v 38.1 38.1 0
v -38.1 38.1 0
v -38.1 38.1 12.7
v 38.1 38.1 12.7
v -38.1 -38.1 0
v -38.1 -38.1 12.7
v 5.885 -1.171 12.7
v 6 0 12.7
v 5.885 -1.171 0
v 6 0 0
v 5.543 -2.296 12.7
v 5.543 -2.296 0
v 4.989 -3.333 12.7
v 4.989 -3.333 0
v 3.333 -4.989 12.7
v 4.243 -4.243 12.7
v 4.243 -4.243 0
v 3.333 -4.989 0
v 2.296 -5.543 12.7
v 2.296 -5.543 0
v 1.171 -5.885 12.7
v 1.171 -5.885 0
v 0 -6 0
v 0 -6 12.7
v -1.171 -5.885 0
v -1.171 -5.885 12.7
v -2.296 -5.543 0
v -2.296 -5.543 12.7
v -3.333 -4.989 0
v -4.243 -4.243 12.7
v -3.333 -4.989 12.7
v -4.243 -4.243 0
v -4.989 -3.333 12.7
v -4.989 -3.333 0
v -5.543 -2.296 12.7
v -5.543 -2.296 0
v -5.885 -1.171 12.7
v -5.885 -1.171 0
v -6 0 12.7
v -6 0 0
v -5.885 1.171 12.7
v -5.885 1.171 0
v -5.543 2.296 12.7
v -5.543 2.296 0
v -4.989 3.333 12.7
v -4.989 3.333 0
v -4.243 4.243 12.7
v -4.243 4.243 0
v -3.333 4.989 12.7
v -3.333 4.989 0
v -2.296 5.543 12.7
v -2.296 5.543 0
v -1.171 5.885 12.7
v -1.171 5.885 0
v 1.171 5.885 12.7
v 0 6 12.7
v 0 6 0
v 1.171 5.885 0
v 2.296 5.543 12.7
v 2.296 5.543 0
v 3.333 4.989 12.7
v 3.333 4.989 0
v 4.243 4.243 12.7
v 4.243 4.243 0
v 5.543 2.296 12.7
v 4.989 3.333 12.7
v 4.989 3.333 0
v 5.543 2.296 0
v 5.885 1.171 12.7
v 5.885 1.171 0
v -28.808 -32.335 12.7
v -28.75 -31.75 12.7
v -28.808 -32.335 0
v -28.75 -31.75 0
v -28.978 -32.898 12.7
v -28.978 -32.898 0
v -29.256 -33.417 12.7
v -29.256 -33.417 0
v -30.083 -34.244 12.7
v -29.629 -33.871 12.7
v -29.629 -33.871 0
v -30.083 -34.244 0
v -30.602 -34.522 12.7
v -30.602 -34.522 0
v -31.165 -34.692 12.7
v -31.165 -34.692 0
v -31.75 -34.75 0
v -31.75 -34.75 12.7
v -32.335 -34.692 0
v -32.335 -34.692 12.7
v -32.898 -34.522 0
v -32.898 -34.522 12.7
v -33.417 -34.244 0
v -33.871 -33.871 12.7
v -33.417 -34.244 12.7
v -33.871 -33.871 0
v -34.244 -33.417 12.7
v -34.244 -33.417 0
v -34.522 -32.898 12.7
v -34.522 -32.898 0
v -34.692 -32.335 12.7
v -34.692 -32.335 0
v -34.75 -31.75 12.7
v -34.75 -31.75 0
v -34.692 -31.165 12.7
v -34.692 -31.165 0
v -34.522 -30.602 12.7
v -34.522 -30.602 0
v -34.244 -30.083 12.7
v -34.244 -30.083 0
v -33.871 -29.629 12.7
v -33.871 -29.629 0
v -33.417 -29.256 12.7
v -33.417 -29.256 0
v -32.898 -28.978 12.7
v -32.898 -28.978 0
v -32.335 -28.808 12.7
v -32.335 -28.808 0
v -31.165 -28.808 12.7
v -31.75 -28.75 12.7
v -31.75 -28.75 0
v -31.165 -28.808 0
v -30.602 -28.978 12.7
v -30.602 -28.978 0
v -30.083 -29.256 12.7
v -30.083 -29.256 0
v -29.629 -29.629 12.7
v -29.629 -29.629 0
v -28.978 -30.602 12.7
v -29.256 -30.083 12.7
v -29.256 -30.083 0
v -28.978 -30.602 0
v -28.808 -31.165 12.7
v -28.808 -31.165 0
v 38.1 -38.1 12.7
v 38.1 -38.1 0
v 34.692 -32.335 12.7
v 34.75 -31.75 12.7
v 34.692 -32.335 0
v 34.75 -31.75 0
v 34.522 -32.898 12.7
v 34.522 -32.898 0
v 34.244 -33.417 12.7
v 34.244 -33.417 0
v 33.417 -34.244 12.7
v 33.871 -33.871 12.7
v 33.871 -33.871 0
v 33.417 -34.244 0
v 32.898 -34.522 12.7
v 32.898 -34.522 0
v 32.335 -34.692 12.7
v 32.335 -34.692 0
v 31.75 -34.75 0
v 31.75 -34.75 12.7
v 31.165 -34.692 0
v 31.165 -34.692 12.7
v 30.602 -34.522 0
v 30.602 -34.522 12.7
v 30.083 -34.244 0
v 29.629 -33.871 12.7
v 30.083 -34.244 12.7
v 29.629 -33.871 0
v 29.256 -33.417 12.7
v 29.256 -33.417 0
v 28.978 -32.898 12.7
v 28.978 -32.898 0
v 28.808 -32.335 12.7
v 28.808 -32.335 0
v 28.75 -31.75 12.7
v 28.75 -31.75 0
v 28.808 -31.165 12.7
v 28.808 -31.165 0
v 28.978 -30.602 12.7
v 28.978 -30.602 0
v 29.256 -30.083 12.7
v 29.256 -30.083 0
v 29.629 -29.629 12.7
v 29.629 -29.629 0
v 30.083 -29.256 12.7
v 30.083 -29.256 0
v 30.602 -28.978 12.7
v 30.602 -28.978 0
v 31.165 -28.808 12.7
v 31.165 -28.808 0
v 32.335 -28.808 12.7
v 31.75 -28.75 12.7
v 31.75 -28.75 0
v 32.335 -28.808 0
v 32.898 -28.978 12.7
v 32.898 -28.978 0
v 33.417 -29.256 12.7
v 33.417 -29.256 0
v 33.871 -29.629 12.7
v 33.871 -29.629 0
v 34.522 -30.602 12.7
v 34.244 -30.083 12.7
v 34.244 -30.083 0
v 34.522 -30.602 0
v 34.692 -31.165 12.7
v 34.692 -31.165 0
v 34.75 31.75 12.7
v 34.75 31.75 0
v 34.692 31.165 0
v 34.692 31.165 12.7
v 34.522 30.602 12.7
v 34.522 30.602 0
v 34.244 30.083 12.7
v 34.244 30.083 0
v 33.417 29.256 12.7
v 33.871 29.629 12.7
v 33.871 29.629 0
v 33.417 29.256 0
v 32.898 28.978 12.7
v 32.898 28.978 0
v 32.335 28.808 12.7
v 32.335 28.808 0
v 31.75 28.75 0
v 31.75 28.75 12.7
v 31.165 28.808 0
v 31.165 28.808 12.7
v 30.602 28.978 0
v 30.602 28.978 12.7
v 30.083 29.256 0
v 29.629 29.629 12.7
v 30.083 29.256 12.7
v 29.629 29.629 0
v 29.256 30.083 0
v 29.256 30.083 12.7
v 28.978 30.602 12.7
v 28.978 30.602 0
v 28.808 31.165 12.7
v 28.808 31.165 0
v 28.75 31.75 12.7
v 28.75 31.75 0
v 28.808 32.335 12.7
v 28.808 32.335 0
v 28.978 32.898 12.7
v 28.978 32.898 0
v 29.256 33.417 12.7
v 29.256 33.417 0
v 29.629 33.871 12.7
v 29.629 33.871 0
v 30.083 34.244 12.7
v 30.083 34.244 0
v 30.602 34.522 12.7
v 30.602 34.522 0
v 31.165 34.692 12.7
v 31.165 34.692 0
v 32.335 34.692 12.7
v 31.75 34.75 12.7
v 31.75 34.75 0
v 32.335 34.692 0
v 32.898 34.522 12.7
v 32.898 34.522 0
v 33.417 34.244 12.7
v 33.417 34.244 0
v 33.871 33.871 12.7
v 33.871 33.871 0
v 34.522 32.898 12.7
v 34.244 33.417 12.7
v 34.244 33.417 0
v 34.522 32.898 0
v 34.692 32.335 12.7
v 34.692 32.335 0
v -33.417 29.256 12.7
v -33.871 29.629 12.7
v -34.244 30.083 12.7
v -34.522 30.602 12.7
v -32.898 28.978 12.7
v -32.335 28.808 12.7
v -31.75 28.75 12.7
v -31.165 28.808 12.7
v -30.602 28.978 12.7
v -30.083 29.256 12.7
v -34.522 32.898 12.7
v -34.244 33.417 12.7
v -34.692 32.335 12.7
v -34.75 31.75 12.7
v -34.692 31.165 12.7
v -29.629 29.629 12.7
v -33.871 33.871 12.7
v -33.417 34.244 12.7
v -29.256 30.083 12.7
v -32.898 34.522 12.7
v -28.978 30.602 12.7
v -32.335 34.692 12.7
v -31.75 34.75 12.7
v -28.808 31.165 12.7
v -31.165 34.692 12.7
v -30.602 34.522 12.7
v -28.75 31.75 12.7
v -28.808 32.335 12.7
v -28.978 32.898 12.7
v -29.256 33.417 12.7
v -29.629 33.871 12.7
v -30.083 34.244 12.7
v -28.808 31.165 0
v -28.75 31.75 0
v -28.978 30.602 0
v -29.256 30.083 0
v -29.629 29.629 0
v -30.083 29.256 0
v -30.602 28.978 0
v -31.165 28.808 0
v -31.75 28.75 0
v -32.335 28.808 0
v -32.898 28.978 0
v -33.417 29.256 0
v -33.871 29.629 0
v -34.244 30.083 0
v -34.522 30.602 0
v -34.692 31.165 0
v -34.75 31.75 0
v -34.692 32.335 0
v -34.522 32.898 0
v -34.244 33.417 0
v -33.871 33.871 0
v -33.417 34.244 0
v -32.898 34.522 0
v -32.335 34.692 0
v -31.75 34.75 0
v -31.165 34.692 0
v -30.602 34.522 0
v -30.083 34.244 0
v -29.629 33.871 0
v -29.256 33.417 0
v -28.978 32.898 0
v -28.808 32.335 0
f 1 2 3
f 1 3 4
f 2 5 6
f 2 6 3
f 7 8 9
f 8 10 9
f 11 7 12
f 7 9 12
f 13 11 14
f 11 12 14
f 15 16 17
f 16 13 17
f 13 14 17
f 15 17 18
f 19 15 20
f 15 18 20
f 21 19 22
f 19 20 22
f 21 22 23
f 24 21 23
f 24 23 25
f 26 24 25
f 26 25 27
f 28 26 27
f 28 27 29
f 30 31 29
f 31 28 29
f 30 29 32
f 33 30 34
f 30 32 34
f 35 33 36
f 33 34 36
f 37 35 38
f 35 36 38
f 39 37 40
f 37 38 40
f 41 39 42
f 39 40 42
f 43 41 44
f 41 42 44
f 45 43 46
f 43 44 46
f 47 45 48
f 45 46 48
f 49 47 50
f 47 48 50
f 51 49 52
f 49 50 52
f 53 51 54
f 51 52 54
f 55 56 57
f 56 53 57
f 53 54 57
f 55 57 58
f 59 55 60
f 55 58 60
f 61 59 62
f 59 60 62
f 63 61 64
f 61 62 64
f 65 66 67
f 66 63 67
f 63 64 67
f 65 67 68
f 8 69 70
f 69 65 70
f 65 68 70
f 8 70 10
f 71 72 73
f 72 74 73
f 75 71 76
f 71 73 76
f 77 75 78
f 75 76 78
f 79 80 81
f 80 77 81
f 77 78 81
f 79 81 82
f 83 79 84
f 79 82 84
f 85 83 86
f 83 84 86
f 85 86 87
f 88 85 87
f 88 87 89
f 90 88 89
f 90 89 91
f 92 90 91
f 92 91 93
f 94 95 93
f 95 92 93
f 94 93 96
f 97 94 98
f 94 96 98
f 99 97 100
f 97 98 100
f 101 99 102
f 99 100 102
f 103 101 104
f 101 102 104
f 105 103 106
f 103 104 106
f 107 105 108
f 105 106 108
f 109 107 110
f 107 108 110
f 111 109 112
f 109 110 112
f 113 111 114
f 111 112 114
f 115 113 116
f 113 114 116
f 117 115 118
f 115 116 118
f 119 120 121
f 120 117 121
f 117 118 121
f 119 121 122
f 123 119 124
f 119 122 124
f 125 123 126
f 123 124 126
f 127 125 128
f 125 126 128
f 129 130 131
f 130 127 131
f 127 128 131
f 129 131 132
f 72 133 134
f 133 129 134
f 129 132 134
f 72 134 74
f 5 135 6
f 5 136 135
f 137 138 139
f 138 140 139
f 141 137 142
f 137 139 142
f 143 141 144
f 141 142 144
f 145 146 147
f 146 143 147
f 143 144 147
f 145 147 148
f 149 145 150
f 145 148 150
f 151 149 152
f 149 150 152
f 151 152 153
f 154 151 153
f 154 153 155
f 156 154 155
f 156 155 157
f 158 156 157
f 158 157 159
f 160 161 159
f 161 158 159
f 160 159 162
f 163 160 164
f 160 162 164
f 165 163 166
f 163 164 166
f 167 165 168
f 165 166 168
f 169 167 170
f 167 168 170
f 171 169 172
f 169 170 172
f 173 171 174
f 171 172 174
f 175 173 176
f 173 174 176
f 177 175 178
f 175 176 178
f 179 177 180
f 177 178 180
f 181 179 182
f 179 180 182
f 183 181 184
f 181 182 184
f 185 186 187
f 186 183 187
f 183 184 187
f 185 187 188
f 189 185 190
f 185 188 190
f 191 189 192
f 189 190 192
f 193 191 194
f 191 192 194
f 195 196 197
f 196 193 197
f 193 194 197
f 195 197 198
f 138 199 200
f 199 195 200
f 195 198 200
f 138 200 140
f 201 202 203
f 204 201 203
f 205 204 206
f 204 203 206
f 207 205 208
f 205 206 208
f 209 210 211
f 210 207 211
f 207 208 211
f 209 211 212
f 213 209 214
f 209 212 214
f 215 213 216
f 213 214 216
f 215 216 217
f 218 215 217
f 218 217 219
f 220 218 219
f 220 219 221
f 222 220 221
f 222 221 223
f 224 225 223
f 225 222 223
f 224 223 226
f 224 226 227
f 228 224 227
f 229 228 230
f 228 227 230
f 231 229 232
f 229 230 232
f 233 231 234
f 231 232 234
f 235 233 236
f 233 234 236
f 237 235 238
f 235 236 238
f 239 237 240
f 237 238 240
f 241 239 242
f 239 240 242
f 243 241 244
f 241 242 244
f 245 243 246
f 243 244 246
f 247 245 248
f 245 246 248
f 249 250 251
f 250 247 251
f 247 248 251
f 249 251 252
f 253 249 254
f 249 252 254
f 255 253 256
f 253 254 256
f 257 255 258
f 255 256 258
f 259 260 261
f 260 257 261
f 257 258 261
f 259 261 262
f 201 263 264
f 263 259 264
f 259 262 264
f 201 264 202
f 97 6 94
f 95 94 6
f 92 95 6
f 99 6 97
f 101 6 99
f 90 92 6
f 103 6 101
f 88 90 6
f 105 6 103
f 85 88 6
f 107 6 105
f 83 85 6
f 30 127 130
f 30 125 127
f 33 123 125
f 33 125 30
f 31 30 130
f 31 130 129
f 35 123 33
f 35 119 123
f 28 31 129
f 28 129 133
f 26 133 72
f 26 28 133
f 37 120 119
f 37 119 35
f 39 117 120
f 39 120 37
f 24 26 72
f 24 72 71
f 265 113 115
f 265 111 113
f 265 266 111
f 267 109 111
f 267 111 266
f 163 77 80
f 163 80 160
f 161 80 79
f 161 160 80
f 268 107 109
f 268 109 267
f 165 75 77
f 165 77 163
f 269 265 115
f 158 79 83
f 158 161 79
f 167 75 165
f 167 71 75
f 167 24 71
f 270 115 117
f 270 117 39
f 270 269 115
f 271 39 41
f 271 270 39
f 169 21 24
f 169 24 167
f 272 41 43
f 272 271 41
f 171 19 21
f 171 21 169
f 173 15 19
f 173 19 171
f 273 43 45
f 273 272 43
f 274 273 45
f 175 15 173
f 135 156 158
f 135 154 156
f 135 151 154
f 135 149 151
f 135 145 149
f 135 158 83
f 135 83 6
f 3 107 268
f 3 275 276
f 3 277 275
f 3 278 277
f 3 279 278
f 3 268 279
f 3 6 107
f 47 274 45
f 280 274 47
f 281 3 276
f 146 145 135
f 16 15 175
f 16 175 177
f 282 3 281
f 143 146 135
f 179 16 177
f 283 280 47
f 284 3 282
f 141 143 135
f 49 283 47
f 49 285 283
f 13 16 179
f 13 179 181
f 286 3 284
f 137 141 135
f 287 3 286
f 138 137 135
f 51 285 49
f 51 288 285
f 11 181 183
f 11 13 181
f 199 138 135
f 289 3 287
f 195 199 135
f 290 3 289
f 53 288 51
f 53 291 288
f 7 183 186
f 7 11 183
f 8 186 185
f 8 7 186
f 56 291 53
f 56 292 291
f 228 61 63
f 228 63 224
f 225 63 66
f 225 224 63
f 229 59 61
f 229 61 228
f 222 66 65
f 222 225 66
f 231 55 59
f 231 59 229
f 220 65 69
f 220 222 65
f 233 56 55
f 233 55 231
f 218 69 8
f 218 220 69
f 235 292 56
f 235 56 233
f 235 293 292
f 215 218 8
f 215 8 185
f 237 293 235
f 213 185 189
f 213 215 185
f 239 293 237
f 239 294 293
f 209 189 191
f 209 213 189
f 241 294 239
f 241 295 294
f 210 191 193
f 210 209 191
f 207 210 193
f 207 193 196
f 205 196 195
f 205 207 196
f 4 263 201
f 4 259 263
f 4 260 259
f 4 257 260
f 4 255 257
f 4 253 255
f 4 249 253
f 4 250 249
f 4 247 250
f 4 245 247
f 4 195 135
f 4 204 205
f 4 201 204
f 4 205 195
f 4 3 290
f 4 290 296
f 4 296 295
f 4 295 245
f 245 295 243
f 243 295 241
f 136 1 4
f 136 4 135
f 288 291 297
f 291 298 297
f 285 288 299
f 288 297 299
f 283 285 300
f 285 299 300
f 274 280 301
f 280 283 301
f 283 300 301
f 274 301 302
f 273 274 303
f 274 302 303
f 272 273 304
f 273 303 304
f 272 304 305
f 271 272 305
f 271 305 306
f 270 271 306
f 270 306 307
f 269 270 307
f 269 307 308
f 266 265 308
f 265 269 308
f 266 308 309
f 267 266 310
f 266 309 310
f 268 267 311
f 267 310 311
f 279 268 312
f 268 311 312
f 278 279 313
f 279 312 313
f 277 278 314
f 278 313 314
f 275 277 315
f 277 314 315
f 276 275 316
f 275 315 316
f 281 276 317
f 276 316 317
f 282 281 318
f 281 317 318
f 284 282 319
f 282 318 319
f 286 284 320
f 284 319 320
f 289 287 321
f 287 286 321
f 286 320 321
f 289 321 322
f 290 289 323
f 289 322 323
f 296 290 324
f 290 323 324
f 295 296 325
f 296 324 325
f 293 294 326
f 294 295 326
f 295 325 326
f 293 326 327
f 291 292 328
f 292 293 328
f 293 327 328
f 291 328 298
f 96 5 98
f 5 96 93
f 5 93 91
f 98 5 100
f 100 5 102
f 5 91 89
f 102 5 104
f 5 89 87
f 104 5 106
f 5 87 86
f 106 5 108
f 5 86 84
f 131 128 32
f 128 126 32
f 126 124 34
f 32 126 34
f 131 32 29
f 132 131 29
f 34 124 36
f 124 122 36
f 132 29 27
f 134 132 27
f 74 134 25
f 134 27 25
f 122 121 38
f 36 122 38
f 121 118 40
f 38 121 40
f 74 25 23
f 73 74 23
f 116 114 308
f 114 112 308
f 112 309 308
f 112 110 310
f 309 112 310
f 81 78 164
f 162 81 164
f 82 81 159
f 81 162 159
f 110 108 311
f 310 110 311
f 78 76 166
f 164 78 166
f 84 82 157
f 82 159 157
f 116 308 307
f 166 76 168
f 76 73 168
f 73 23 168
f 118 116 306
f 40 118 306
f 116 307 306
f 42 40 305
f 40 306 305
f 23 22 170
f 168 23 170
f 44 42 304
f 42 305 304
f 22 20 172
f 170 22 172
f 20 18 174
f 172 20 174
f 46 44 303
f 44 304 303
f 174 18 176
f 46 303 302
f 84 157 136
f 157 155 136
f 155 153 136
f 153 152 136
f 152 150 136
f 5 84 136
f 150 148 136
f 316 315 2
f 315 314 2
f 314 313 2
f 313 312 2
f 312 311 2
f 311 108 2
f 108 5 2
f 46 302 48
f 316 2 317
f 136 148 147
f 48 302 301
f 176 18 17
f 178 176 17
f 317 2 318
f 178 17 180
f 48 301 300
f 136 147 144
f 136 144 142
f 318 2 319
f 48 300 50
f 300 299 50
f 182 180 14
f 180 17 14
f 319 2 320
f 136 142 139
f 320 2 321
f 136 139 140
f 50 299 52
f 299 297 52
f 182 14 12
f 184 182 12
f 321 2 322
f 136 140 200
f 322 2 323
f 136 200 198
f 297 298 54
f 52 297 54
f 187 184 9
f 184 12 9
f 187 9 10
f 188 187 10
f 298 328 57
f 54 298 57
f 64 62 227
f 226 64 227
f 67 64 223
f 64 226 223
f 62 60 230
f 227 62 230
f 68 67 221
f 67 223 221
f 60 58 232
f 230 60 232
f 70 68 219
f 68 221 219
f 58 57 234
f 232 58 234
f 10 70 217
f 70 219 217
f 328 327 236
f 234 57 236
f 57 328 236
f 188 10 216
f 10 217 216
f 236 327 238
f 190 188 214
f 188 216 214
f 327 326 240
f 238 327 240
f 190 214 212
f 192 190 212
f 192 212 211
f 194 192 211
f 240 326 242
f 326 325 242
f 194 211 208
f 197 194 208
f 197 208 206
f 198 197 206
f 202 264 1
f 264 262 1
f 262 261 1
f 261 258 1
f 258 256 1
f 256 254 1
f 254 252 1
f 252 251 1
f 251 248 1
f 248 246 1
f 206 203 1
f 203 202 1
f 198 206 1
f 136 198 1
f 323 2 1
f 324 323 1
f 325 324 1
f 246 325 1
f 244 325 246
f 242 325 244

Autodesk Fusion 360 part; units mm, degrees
sketch "Sketch1" plane through (0, 0, 0) normal (0, 0, 1) x (1, 0, 0)
  line L0 (38.1, -38.1) -> (-38.1, -38.1)
  line L1 (-38.1, -38.1) -> (-38.1, 38.1)
  line L2 (-38.1, 38.1) -> (38.1, 38.1)
  line L3 (38.1, 38.1) -> (38.1, -38.1)
  line L4 (38.1, -38.1) -> (-38.1, 38.1) construction
  line L5 (-38.1, -38.1) -> (38.1, 38.1) construction
  line L6 (31.75, 31.75) -> (-31.75, 31.75) construction
  line L7 (-31.75, 31.75) -> (-31.75, -31.75) construction
  line L8 (-31.75, -31.75) -> (31.75, -31.75) construction
  line L9 (31.75, -31.75) -> (31.75, 31.75) construction
  line L10 (31.75, 31.75) -> (-31.75, -31.75) construction
  line L11 (-31.75, 31.75) -> (31.75, -31.75) construction
  circle A0 centre (-31.75, 31.75) radius 3
  circle A1 centre (-31.75, -31.75) radius 3
  circle A2 centre (31.75, -31.75) radius 3
  circle A3 centre (31.75, 31.75) radius 3
  circle A4 centre (0, 0) radius 6
  dimension "d1" = 76.2
  dimension "d2" = 76.2
  dimension "d3" = 63.5
  dimension "d4" = 63.5
  dimension "d5" = 6
  dimension "d7" = 360
  dimension "d10" = 12
extrude "Extrude1" add sketch "Sketch1" along normal blind 12.7
sketch "Sketch2" plane through (0, 0, 12.7) normal (0, 0, 1) x (-1, 0, 0)
  circle A0 centre (31.75, -31.75) radius 3
  circle A1 centre (0, 0) radius 6
  circle A2 centre (31.75, 31.75) radius 3
  circle A3 centre (-31.75, -31.75) radius 3
  circle A4 centre (-31.75, 31.75) radius 3
  line L0 (-38.1, -38.1) -> (38.1, -38.1)
  line L1 (38.1, -38.1) -> (38.1, 38.1)
  line L2 (38.1, 38.1) -> (-38.1, 38.1)
  line L3 (-38.1, 38.1) -> (-38.1, -38.1)
